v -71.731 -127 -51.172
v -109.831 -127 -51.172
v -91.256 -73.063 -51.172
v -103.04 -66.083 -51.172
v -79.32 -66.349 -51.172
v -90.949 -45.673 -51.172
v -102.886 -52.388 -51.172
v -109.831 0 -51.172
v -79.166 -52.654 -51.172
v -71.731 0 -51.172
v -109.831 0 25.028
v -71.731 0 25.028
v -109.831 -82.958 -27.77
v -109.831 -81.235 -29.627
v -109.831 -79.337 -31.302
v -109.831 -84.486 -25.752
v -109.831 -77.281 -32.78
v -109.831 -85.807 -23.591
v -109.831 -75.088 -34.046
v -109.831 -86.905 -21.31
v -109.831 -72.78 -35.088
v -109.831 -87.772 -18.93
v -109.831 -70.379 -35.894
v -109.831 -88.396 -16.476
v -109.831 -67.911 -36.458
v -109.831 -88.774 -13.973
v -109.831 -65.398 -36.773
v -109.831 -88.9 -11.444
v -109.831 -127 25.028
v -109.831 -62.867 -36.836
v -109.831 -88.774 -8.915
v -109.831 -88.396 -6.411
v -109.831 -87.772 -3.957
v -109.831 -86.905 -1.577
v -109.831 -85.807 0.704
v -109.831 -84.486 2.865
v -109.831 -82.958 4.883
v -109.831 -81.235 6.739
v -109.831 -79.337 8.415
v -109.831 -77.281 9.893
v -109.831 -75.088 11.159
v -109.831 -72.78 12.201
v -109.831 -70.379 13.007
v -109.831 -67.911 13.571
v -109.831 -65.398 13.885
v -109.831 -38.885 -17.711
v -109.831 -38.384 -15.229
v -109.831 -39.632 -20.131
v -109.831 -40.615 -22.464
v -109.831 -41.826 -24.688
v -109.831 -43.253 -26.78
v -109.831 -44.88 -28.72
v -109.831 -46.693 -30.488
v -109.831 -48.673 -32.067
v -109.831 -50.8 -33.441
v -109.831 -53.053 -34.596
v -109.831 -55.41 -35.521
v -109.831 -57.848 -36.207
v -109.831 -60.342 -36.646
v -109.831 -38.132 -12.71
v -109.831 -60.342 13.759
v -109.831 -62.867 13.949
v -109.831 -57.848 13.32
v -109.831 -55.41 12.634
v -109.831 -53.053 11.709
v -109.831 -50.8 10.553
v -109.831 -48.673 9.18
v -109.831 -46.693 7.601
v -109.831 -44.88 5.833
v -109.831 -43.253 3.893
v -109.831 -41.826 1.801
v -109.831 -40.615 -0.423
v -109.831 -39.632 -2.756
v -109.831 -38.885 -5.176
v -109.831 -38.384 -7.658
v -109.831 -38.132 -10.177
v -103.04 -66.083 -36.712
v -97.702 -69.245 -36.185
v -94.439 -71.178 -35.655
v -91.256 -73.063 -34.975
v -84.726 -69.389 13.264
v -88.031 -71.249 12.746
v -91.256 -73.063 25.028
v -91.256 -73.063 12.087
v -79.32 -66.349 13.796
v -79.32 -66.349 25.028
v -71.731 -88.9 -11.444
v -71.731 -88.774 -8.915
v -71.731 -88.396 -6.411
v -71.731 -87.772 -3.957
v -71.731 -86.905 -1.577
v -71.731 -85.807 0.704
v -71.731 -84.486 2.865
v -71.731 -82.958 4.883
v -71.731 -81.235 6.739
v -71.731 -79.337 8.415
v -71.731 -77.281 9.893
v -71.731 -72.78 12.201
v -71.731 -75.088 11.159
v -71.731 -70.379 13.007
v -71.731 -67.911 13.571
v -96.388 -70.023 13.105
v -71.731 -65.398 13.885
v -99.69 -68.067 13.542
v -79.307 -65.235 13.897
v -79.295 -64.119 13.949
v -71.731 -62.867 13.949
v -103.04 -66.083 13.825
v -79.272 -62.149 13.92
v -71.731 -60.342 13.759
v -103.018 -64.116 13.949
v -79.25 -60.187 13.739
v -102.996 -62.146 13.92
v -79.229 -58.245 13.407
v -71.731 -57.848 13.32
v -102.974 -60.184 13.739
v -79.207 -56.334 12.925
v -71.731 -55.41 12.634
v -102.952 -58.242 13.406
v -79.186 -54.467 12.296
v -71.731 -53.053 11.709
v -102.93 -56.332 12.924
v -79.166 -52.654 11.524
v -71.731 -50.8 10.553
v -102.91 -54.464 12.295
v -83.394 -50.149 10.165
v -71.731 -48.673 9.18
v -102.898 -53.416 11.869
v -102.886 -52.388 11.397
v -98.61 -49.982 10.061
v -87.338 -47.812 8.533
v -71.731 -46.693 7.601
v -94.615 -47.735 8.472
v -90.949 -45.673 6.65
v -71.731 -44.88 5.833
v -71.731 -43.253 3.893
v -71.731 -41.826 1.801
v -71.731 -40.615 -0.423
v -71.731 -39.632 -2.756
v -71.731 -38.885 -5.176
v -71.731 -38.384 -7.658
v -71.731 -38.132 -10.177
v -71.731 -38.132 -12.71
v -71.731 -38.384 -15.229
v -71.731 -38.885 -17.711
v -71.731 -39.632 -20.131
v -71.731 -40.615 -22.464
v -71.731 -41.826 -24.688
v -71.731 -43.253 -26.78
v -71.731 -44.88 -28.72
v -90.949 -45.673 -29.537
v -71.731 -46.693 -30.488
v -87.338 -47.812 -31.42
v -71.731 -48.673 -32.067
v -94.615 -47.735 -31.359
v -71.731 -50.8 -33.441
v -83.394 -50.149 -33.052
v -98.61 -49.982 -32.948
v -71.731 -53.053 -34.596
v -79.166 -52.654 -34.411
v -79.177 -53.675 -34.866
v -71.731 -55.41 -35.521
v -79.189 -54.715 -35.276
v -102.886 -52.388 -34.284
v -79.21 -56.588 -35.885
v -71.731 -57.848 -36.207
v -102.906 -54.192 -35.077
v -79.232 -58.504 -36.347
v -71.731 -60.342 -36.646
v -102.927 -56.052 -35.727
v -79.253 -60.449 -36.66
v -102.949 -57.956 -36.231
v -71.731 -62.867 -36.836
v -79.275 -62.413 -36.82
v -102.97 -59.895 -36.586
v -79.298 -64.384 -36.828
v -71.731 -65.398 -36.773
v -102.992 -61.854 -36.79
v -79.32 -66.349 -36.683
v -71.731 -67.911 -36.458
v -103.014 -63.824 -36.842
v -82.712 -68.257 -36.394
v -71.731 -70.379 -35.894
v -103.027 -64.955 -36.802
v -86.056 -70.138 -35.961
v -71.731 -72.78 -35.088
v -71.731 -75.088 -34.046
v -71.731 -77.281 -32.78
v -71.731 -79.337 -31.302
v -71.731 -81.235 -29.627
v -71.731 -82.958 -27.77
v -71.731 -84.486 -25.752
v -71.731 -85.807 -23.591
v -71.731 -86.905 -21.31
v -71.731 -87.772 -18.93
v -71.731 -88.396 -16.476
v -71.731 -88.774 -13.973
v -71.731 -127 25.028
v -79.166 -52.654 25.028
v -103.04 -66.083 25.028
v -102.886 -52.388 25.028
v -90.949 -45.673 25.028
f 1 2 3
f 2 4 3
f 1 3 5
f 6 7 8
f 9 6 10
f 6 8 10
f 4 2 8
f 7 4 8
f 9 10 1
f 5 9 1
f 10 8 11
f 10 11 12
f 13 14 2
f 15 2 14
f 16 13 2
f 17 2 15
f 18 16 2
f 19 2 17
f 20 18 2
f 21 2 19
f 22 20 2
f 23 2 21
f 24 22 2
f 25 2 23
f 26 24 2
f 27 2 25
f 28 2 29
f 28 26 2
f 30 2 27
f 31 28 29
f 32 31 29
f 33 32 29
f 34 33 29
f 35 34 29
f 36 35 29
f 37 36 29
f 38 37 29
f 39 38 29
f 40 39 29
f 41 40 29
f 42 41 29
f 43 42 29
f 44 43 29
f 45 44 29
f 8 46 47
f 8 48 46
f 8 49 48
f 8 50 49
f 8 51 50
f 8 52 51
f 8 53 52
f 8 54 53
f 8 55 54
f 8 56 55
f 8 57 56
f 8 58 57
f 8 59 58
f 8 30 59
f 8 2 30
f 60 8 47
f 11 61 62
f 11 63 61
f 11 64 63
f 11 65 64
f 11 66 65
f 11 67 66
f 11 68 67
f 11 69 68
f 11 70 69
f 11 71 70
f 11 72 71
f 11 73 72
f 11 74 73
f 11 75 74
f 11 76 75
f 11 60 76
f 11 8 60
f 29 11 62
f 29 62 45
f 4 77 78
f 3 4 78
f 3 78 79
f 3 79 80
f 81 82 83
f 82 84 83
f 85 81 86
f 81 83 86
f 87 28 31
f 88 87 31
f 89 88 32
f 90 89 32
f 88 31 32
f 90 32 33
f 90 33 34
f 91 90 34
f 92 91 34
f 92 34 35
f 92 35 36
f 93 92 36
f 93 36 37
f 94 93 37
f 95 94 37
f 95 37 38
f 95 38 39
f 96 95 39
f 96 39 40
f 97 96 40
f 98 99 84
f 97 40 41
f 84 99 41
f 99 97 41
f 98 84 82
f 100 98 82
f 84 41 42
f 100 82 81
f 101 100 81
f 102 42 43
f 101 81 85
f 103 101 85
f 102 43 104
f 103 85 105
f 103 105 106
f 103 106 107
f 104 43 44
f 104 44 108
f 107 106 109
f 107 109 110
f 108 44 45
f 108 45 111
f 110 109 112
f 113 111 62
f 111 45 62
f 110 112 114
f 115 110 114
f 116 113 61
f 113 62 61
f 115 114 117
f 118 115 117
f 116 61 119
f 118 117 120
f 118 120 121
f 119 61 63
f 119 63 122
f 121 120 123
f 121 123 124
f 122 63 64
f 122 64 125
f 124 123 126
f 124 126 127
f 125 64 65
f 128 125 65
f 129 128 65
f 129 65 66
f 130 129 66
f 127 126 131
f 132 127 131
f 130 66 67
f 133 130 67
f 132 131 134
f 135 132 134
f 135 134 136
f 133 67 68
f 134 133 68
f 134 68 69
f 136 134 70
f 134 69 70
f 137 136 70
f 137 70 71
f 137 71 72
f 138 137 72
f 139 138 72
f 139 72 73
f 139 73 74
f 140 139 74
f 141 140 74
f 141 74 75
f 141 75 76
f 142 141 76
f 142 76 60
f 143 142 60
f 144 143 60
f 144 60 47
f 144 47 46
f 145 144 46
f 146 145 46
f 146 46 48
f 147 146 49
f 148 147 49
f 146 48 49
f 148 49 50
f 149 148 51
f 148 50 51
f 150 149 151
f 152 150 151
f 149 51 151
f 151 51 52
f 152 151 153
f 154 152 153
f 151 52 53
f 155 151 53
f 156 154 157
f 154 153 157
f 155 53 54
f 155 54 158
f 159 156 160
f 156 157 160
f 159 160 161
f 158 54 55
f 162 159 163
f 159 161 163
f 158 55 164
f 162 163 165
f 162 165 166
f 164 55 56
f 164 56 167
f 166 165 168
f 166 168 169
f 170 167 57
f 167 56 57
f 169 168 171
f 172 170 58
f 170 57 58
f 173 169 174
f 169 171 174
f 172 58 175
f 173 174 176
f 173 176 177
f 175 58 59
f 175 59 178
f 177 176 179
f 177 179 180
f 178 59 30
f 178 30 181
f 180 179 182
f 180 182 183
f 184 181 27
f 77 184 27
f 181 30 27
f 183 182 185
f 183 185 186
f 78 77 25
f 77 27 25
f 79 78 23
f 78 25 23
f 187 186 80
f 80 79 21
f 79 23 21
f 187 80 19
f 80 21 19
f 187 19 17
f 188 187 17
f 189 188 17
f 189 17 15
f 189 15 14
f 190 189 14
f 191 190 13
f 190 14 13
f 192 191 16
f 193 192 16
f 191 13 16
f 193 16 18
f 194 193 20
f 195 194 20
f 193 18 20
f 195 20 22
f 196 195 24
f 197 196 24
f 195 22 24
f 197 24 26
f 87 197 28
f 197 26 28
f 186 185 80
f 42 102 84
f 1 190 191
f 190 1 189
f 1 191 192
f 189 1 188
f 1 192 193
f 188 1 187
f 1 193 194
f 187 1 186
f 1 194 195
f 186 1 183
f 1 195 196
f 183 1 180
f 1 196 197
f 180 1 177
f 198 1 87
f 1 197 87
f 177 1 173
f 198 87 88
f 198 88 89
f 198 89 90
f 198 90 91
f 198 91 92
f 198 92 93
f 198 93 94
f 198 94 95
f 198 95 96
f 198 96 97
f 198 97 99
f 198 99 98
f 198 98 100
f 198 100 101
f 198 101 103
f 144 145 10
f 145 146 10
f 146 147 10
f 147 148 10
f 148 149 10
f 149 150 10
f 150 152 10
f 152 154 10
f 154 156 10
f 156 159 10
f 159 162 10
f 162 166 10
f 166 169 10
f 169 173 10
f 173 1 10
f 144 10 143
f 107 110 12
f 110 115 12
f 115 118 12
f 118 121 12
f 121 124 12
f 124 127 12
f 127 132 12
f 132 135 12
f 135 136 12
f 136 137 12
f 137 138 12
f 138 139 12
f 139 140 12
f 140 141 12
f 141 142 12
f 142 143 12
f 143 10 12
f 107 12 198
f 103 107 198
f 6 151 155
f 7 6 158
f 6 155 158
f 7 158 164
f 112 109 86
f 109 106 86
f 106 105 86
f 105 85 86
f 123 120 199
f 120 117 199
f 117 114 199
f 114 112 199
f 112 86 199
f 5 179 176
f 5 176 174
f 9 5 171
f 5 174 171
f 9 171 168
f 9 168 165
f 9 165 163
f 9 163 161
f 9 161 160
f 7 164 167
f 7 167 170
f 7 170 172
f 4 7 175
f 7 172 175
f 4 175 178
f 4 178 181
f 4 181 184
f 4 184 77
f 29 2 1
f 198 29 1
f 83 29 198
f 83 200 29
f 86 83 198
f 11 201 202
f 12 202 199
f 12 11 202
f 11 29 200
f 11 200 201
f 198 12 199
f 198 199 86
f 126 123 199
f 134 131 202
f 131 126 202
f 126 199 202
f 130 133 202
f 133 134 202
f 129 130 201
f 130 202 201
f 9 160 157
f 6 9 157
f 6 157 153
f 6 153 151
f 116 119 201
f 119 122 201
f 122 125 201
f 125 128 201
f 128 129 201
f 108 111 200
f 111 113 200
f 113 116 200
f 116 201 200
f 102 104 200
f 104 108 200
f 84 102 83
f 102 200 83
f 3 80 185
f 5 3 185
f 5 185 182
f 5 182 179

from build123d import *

# Parameters (mm, degrees)
F0_W     = 38.1
F0_H     = 76.2
F1_DEPTH = 127
F2_R     = 25.4
F3_DEPTH = 101.6
F5_DEPTH = 76.2


with BuildPart() as f1:
    # F0 (on Front) → F1 (new body)
    with BuildSketch(Plane.XZ):
        with Locations((-90.780935, -13.071662)):
            Rectangle(F0_W, F0_H)
    extrude(amount=F1_DEPTH)

    # F2 (on face) → F3 (cut)
    with BuildSketch(Plane(origin=(-109.830935, 0, 0), x_dir=(0, -1, 0), z_dir=(-1, 0, 0))):
        with Locations((63.500002, -11.443584)):
            Circle(F2_R)
    extrude(amount=-F3_DEPTH, mode=Mode.SUBTRACT)

    # F4 (on face) → F5 (cut, through all)
    with BuildSketch(Plane.XY.offset(25.028338)):
        Polygon((-90.949364, -45.673328), (-102.886237, -52.387816), (-103.039757, -66.082696), (-91.256403, -73.063088), (-79.319529, -66.3486), (-79.16601, -52.65372), align=None)
    extrude(amount=-F5_DEPTH, mode=Mode.SUBTRACT)


solid = f1.part
